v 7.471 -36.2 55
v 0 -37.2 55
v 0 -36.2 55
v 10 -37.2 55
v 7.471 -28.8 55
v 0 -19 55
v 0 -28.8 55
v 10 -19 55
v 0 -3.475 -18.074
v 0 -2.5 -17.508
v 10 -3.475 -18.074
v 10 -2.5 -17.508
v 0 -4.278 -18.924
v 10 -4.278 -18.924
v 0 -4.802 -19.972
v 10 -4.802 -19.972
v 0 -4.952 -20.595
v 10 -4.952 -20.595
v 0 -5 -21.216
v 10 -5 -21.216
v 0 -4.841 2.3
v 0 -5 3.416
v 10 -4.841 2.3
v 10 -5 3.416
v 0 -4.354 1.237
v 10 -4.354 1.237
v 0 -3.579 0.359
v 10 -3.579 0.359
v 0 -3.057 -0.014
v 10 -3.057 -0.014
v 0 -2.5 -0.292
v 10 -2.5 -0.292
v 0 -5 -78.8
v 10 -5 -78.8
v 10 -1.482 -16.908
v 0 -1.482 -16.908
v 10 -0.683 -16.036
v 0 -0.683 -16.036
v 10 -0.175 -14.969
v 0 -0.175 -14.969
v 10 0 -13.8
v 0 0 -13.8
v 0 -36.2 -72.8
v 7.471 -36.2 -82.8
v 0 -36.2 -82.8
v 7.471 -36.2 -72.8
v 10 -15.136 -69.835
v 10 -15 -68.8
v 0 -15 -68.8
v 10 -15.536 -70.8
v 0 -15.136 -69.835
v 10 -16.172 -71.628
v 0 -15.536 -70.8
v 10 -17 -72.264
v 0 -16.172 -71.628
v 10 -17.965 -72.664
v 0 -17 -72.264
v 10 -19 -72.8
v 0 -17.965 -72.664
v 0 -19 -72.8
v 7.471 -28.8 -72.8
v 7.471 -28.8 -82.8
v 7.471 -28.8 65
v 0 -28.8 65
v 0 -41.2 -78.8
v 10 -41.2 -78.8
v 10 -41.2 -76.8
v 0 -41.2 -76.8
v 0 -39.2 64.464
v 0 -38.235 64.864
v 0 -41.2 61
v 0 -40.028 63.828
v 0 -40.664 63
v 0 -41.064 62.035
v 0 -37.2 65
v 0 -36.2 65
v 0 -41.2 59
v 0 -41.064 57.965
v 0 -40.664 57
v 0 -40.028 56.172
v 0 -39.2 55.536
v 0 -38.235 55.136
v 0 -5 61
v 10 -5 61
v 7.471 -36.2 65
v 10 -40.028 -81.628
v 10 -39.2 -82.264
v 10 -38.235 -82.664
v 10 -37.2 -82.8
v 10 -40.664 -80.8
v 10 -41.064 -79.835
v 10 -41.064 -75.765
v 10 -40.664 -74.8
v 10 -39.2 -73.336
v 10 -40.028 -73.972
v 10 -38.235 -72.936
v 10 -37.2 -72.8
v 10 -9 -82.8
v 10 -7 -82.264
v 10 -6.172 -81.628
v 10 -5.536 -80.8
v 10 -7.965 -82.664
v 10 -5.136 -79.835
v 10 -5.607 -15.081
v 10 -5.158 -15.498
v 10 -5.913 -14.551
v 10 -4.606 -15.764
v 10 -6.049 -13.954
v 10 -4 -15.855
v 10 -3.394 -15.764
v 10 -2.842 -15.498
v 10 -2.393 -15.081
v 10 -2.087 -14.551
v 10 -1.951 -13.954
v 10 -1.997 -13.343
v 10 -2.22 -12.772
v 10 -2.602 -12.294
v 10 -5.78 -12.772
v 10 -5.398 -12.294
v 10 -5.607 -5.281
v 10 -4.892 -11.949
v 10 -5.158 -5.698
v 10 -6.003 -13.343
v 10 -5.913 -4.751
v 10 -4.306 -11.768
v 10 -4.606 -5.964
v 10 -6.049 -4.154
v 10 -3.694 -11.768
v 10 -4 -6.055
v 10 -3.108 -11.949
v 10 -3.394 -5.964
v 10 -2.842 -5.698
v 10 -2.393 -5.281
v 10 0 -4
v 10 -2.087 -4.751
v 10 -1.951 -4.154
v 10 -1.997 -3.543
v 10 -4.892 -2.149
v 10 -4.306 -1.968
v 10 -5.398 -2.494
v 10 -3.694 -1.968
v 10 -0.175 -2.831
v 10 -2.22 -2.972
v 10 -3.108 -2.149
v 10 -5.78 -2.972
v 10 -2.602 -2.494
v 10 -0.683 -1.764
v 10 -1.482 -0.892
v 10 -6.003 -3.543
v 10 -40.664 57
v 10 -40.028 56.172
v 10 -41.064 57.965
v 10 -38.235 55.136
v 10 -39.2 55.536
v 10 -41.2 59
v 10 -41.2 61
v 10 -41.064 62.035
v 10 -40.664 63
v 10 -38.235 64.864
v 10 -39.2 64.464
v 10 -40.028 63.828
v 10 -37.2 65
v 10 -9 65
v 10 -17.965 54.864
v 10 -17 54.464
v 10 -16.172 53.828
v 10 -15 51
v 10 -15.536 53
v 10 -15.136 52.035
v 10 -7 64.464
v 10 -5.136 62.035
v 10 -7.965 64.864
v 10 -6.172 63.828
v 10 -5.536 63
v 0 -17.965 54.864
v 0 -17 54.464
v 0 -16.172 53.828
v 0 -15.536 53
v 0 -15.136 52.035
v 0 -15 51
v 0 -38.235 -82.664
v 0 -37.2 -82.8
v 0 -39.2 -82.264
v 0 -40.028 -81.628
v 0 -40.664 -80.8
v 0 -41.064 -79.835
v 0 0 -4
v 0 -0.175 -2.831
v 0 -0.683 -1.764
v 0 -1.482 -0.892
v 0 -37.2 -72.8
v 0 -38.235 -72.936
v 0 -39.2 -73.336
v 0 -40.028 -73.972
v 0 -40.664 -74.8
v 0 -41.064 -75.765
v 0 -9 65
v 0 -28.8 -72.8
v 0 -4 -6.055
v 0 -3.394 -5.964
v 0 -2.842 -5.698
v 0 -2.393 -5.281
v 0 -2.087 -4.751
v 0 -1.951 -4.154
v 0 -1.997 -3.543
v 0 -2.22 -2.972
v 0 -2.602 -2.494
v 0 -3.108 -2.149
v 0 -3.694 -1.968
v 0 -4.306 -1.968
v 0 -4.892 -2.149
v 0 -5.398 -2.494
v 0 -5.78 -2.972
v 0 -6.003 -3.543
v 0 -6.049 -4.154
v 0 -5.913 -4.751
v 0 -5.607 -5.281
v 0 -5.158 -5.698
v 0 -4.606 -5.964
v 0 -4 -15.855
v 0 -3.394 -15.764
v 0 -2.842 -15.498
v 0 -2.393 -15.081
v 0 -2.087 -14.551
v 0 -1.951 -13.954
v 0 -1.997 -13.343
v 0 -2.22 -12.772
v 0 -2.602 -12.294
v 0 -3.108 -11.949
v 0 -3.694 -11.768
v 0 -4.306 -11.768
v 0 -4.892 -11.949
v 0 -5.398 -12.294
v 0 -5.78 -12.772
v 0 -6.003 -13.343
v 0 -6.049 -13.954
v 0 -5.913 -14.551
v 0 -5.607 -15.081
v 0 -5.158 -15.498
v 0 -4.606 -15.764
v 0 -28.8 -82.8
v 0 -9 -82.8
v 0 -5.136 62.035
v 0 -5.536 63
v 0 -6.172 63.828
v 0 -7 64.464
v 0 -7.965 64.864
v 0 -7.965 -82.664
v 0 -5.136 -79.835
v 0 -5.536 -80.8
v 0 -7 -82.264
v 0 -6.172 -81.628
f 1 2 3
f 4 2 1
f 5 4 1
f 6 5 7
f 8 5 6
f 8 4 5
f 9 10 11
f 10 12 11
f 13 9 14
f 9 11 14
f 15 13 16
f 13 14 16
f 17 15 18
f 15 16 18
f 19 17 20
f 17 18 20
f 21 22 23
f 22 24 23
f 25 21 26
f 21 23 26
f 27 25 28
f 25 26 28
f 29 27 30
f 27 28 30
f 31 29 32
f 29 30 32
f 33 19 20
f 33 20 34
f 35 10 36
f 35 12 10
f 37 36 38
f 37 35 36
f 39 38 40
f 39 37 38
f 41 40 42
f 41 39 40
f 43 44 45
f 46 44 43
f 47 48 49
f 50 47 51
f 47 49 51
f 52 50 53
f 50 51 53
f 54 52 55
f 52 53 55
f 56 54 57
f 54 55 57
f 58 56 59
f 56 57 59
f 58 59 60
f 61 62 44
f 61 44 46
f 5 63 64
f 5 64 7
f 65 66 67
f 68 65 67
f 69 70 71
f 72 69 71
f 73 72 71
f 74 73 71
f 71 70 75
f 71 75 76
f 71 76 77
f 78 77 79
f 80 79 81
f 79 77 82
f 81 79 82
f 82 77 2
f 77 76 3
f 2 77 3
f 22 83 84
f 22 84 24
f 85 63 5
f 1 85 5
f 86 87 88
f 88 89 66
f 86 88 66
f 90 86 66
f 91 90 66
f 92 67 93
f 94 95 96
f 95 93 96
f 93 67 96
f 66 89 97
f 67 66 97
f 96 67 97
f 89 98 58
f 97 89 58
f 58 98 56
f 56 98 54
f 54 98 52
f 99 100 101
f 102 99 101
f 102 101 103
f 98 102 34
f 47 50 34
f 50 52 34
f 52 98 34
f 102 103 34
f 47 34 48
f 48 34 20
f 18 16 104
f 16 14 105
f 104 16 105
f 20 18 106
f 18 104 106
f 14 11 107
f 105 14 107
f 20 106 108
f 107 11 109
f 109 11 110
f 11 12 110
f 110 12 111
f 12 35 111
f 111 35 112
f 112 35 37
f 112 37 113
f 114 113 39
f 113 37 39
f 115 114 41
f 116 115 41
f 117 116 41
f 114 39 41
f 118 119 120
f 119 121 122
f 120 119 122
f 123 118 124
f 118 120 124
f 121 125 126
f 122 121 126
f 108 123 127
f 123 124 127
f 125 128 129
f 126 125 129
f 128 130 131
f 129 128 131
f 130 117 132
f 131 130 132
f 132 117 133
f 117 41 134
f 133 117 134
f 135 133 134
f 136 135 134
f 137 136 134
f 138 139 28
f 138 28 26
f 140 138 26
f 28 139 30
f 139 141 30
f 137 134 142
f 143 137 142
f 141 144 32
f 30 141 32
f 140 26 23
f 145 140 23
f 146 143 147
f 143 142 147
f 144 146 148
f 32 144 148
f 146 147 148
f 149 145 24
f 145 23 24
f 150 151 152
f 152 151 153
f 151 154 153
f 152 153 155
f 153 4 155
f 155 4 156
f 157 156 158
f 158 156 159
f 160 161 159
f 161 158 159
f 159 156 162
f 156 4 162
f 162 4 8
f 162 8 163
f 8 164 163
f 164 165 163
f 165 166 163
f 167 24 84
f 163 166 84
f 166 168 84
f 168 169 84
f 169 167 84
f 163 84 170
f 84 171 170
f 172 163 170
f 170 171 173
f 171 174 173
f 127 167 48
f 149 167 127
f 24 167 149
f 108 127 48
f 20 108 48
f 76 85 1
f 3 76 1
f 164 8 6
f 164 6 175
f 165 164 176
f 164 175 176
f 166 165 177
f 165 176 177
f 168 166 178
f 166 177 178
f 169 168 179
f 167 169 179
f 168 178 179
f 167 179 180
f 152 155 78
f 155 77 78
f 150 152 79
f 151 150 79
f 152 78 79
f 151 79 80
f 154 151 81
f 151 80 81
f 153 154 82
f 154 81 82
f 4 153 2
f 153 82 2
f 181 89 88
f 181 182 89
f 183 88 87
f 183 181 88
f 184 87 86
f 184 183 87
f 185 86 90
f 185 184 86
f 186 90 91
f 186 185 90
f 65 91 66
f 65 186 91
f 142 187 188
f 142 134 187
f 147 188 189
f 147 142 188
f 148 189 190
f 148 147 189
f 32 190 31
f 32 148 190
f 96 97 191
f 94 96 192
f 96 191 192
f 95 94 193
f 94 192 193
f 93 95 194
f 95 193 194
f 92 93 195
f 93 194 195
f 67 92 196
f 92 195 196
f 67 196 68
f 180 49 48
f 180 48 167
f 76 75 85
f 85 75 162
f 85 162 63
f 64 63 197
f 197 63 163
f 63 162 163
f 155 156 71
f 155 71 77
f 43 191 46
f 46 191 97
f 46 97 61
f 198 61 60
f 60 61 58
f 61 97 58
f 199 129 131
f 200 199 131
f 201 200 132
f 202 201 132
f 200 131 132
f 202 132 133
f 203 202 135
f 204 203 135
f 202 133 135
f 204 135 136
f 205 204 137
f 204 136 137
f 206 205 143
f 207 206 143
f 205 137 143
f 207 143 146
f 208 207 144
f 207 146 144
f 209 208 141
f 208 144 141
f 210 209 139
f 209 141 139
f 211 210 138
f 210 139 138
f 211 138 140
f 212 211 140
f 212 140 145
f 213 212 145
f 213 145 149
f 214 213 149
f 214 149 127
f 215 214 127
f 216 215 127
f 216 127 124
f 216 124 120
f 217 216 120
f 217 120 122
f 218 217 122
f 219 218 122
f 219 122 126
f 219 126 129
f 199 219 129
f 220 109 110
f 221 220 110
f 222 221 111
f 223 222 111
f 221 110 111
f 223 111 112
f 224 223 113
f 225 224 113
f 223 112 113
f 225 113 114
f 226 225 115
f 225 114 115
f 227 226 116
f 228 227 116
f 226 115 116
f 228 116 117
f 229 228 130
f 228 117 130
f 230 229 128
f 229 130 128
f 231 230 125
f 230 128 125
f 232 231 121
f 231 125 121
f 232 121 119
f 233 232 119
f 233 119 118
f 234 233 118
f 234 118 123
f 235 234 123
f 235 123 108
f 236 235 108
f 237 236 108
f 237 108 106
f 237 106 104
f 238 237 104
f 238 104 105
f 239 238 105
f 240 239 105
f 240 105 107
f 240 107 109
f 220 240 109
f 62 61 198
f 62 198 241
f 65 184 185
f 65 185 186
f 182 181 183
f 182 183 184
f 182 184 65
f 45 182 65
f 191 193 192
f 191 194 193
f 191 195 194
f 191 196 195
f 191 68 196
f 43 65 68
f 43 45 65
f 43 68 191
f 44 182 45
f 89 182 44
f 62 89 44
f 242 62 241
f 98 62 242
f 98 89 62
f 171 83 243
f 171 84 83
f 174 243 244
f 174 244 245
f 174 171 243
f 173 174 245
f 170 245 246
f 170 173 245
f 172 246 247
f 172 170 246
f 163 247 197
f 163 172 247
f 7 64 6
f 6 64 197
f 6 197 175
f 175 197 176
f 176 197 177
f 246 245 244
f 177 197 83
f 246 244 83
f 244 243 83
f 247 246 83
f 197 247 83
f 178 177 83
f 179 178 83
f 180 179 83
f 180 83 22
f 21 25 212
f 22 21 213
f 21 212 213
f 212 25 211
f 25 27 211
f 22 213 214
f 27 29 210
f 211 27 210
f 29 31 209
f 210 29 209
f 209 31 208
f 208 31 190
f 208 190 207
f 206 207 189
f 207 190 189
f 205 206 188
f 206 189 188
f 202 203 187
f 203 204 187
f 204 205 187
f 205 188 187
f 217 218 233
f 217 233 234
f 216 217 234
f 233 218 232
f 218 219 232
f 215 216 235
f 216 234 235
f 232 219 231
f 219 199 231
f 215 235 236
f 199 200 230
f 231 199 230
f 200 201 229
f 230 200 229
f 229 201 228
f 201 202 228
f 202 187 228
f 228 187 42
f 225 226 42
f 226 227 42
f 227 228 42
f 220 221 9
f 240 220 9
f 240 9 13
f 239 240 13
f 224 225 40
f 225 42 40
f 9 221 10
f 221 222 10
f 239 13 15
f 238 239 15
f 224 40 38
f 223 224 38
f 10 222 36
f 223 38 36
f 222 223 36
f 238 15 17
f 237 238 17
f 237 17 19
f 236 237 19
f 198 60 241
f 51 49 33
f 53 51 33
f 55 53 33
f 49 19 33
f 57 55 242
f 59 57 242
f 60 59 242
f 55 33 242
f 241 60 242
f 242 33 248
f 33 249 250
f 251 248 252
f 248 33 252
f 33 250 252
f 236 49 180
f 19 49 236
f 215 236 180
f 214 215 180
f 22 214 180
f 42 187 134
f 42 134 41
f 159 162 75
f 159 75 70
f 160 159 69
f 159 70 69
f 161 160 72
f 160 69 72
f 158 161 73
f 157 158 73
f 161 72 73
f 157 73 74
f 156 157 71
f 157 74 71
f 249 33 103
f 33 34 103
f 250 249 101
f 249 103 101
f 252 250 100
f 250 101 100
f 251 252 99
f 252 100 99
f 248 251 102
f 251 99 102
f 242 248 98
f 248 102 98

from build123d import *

# Parameters (mm, degrees)
BOSS_EXTRUDE1_DEPTH = 10
SKETCH3_R           = 2.055
CUT_EXTRUDE1_DEPTH  = 85.739837149
SKETCH5_W           = 10
SKETCH5_H           = 13.8
BOSS_EXTRUDE2_DEPTH = 10
SKETCH10_W          = 10
SKETCH10_H          = 7.4
BOSS_EXTRUDE5_DEPTH = 2.52893219
SKETCH11_W          = 10
SKETCH11_H          = 5
BOSS_EXTRUDE6_DEPTH = 10
FILLET1_R           = 4
FILLET2_R           = 4
FILLET3_R           = 4


with BuildPart() as part:
    # Sketch1 → Boss-Extrude1 (new body)
    with BuildSketch(Plane(origin=(0, 0, 0), x_dir=(0, 0, -1), z_dir=(1, 0, 0))):
        Polygon((17.8, -5), (82.8, -5), (82.8, -15), (-65, -15), (-65, -5), (0, -5), (0, 0), (17.8, 0), align=None)
    extrude(amount=BOSS_EXTRUDE1_DEPTH)

    # Sketch3 → Cut-Extrude1 (cut, through all)
    with BuildSketch(Plane(origin=(10, 0, 0), x_dir=(0, 0, -1), z_dir=(1, 0, 0))):
        with Locations((4, -4)):
            Circle(SKETCH3_R)
        with Locations((13.8, -4)):
            Circle(SKETCH3_R)
    extrude(amount=-CUT_EXTRUDE1_DEPTH, mode=Mode.SUBTRACT)

    # Sketch5 → Boss-Extrude2 (add)
    with BuildSketch(Plane(origin=(10, 0, 0), x_dir=(0, 0, -1), z_dir=(1, 0, 0))):
        with Locations((-60, -21.9)):
            Rectangle(SKETCH5_W, SKETCH5_H)
        with Locations((77.8, -21.9)):
            Rectangle(SKETCH5_W, SKETCH5_H)
    extrude(amount=-BOSS_EXTRUDE2_DEPTH)

    # Sketch10 → Boss-Extrude5 (add)
    with BuildSketch(Plane(origin=(10, 0, 0), x_dir=(0, 0, -1), z_dir=(1, 0, 0))):
        with Locations((-60, -32.5)):
            Rectangle(SKETCH10_W, SKETCH10_H)
    boss_extrude5 = extrude(amount=-BOSS_EXTRUDE5_DEPTH)

    # Sketch11 → Boss-Extrude6 (add)
    with BuildSketch(Plane(origin=(10, 0, 0), x_dir=(0, 0, -1), z_dir=(1, 0, 0))):
        with Locations((-60, -38.7)):
            Rectangle(SKETCH11_W, SKETCH11_H)
    boss_extrude6 = extrude(amount=-BOSS_EXTRUDE6_DEPTH)

    # Mirror1: Boss-Extrude5, Boss-Extrude6 across plane
    add(boss_extrude5.mirror(Plane.XY.offset(-8.9)))
    add(boss_extrude6.mirror(Plane.XY.offset(-8.9)))

    # Fillet1
    fillet1_edges = [part.edges().sort_by_distance(p)[0] for p in [
        (5, 0, 0),
        (5, 0, -17.8),
    ]]
    fillet(fillet1_edges, radius=FILLET1_R)

    # Fillet2
    fillet2_edges = [part.edges().sort_by_distance(p)[0] for p in [
        (5, -5, -82.8),
        (5, -5, 65),
        (5, -15, 55),
        (5, -15, -72.8),
        (5, -41.2, 55),
        (5, -41.2, 65),
        (5, -41.2, -82.8),
        (5, -41.2, -72.8),
    ]]
    fillet(fillet2_edges, radius=FILLET2_R)

    # Fillet3
    fillet3_edges = [part.edges().sort_by_distance(p)[0] for p in [
        (5, -5, -17.8),
        (5, -5, 0),
    ]]
    fillet(fillet3_edges, radius=FILLET3_R)


solid = part.part
